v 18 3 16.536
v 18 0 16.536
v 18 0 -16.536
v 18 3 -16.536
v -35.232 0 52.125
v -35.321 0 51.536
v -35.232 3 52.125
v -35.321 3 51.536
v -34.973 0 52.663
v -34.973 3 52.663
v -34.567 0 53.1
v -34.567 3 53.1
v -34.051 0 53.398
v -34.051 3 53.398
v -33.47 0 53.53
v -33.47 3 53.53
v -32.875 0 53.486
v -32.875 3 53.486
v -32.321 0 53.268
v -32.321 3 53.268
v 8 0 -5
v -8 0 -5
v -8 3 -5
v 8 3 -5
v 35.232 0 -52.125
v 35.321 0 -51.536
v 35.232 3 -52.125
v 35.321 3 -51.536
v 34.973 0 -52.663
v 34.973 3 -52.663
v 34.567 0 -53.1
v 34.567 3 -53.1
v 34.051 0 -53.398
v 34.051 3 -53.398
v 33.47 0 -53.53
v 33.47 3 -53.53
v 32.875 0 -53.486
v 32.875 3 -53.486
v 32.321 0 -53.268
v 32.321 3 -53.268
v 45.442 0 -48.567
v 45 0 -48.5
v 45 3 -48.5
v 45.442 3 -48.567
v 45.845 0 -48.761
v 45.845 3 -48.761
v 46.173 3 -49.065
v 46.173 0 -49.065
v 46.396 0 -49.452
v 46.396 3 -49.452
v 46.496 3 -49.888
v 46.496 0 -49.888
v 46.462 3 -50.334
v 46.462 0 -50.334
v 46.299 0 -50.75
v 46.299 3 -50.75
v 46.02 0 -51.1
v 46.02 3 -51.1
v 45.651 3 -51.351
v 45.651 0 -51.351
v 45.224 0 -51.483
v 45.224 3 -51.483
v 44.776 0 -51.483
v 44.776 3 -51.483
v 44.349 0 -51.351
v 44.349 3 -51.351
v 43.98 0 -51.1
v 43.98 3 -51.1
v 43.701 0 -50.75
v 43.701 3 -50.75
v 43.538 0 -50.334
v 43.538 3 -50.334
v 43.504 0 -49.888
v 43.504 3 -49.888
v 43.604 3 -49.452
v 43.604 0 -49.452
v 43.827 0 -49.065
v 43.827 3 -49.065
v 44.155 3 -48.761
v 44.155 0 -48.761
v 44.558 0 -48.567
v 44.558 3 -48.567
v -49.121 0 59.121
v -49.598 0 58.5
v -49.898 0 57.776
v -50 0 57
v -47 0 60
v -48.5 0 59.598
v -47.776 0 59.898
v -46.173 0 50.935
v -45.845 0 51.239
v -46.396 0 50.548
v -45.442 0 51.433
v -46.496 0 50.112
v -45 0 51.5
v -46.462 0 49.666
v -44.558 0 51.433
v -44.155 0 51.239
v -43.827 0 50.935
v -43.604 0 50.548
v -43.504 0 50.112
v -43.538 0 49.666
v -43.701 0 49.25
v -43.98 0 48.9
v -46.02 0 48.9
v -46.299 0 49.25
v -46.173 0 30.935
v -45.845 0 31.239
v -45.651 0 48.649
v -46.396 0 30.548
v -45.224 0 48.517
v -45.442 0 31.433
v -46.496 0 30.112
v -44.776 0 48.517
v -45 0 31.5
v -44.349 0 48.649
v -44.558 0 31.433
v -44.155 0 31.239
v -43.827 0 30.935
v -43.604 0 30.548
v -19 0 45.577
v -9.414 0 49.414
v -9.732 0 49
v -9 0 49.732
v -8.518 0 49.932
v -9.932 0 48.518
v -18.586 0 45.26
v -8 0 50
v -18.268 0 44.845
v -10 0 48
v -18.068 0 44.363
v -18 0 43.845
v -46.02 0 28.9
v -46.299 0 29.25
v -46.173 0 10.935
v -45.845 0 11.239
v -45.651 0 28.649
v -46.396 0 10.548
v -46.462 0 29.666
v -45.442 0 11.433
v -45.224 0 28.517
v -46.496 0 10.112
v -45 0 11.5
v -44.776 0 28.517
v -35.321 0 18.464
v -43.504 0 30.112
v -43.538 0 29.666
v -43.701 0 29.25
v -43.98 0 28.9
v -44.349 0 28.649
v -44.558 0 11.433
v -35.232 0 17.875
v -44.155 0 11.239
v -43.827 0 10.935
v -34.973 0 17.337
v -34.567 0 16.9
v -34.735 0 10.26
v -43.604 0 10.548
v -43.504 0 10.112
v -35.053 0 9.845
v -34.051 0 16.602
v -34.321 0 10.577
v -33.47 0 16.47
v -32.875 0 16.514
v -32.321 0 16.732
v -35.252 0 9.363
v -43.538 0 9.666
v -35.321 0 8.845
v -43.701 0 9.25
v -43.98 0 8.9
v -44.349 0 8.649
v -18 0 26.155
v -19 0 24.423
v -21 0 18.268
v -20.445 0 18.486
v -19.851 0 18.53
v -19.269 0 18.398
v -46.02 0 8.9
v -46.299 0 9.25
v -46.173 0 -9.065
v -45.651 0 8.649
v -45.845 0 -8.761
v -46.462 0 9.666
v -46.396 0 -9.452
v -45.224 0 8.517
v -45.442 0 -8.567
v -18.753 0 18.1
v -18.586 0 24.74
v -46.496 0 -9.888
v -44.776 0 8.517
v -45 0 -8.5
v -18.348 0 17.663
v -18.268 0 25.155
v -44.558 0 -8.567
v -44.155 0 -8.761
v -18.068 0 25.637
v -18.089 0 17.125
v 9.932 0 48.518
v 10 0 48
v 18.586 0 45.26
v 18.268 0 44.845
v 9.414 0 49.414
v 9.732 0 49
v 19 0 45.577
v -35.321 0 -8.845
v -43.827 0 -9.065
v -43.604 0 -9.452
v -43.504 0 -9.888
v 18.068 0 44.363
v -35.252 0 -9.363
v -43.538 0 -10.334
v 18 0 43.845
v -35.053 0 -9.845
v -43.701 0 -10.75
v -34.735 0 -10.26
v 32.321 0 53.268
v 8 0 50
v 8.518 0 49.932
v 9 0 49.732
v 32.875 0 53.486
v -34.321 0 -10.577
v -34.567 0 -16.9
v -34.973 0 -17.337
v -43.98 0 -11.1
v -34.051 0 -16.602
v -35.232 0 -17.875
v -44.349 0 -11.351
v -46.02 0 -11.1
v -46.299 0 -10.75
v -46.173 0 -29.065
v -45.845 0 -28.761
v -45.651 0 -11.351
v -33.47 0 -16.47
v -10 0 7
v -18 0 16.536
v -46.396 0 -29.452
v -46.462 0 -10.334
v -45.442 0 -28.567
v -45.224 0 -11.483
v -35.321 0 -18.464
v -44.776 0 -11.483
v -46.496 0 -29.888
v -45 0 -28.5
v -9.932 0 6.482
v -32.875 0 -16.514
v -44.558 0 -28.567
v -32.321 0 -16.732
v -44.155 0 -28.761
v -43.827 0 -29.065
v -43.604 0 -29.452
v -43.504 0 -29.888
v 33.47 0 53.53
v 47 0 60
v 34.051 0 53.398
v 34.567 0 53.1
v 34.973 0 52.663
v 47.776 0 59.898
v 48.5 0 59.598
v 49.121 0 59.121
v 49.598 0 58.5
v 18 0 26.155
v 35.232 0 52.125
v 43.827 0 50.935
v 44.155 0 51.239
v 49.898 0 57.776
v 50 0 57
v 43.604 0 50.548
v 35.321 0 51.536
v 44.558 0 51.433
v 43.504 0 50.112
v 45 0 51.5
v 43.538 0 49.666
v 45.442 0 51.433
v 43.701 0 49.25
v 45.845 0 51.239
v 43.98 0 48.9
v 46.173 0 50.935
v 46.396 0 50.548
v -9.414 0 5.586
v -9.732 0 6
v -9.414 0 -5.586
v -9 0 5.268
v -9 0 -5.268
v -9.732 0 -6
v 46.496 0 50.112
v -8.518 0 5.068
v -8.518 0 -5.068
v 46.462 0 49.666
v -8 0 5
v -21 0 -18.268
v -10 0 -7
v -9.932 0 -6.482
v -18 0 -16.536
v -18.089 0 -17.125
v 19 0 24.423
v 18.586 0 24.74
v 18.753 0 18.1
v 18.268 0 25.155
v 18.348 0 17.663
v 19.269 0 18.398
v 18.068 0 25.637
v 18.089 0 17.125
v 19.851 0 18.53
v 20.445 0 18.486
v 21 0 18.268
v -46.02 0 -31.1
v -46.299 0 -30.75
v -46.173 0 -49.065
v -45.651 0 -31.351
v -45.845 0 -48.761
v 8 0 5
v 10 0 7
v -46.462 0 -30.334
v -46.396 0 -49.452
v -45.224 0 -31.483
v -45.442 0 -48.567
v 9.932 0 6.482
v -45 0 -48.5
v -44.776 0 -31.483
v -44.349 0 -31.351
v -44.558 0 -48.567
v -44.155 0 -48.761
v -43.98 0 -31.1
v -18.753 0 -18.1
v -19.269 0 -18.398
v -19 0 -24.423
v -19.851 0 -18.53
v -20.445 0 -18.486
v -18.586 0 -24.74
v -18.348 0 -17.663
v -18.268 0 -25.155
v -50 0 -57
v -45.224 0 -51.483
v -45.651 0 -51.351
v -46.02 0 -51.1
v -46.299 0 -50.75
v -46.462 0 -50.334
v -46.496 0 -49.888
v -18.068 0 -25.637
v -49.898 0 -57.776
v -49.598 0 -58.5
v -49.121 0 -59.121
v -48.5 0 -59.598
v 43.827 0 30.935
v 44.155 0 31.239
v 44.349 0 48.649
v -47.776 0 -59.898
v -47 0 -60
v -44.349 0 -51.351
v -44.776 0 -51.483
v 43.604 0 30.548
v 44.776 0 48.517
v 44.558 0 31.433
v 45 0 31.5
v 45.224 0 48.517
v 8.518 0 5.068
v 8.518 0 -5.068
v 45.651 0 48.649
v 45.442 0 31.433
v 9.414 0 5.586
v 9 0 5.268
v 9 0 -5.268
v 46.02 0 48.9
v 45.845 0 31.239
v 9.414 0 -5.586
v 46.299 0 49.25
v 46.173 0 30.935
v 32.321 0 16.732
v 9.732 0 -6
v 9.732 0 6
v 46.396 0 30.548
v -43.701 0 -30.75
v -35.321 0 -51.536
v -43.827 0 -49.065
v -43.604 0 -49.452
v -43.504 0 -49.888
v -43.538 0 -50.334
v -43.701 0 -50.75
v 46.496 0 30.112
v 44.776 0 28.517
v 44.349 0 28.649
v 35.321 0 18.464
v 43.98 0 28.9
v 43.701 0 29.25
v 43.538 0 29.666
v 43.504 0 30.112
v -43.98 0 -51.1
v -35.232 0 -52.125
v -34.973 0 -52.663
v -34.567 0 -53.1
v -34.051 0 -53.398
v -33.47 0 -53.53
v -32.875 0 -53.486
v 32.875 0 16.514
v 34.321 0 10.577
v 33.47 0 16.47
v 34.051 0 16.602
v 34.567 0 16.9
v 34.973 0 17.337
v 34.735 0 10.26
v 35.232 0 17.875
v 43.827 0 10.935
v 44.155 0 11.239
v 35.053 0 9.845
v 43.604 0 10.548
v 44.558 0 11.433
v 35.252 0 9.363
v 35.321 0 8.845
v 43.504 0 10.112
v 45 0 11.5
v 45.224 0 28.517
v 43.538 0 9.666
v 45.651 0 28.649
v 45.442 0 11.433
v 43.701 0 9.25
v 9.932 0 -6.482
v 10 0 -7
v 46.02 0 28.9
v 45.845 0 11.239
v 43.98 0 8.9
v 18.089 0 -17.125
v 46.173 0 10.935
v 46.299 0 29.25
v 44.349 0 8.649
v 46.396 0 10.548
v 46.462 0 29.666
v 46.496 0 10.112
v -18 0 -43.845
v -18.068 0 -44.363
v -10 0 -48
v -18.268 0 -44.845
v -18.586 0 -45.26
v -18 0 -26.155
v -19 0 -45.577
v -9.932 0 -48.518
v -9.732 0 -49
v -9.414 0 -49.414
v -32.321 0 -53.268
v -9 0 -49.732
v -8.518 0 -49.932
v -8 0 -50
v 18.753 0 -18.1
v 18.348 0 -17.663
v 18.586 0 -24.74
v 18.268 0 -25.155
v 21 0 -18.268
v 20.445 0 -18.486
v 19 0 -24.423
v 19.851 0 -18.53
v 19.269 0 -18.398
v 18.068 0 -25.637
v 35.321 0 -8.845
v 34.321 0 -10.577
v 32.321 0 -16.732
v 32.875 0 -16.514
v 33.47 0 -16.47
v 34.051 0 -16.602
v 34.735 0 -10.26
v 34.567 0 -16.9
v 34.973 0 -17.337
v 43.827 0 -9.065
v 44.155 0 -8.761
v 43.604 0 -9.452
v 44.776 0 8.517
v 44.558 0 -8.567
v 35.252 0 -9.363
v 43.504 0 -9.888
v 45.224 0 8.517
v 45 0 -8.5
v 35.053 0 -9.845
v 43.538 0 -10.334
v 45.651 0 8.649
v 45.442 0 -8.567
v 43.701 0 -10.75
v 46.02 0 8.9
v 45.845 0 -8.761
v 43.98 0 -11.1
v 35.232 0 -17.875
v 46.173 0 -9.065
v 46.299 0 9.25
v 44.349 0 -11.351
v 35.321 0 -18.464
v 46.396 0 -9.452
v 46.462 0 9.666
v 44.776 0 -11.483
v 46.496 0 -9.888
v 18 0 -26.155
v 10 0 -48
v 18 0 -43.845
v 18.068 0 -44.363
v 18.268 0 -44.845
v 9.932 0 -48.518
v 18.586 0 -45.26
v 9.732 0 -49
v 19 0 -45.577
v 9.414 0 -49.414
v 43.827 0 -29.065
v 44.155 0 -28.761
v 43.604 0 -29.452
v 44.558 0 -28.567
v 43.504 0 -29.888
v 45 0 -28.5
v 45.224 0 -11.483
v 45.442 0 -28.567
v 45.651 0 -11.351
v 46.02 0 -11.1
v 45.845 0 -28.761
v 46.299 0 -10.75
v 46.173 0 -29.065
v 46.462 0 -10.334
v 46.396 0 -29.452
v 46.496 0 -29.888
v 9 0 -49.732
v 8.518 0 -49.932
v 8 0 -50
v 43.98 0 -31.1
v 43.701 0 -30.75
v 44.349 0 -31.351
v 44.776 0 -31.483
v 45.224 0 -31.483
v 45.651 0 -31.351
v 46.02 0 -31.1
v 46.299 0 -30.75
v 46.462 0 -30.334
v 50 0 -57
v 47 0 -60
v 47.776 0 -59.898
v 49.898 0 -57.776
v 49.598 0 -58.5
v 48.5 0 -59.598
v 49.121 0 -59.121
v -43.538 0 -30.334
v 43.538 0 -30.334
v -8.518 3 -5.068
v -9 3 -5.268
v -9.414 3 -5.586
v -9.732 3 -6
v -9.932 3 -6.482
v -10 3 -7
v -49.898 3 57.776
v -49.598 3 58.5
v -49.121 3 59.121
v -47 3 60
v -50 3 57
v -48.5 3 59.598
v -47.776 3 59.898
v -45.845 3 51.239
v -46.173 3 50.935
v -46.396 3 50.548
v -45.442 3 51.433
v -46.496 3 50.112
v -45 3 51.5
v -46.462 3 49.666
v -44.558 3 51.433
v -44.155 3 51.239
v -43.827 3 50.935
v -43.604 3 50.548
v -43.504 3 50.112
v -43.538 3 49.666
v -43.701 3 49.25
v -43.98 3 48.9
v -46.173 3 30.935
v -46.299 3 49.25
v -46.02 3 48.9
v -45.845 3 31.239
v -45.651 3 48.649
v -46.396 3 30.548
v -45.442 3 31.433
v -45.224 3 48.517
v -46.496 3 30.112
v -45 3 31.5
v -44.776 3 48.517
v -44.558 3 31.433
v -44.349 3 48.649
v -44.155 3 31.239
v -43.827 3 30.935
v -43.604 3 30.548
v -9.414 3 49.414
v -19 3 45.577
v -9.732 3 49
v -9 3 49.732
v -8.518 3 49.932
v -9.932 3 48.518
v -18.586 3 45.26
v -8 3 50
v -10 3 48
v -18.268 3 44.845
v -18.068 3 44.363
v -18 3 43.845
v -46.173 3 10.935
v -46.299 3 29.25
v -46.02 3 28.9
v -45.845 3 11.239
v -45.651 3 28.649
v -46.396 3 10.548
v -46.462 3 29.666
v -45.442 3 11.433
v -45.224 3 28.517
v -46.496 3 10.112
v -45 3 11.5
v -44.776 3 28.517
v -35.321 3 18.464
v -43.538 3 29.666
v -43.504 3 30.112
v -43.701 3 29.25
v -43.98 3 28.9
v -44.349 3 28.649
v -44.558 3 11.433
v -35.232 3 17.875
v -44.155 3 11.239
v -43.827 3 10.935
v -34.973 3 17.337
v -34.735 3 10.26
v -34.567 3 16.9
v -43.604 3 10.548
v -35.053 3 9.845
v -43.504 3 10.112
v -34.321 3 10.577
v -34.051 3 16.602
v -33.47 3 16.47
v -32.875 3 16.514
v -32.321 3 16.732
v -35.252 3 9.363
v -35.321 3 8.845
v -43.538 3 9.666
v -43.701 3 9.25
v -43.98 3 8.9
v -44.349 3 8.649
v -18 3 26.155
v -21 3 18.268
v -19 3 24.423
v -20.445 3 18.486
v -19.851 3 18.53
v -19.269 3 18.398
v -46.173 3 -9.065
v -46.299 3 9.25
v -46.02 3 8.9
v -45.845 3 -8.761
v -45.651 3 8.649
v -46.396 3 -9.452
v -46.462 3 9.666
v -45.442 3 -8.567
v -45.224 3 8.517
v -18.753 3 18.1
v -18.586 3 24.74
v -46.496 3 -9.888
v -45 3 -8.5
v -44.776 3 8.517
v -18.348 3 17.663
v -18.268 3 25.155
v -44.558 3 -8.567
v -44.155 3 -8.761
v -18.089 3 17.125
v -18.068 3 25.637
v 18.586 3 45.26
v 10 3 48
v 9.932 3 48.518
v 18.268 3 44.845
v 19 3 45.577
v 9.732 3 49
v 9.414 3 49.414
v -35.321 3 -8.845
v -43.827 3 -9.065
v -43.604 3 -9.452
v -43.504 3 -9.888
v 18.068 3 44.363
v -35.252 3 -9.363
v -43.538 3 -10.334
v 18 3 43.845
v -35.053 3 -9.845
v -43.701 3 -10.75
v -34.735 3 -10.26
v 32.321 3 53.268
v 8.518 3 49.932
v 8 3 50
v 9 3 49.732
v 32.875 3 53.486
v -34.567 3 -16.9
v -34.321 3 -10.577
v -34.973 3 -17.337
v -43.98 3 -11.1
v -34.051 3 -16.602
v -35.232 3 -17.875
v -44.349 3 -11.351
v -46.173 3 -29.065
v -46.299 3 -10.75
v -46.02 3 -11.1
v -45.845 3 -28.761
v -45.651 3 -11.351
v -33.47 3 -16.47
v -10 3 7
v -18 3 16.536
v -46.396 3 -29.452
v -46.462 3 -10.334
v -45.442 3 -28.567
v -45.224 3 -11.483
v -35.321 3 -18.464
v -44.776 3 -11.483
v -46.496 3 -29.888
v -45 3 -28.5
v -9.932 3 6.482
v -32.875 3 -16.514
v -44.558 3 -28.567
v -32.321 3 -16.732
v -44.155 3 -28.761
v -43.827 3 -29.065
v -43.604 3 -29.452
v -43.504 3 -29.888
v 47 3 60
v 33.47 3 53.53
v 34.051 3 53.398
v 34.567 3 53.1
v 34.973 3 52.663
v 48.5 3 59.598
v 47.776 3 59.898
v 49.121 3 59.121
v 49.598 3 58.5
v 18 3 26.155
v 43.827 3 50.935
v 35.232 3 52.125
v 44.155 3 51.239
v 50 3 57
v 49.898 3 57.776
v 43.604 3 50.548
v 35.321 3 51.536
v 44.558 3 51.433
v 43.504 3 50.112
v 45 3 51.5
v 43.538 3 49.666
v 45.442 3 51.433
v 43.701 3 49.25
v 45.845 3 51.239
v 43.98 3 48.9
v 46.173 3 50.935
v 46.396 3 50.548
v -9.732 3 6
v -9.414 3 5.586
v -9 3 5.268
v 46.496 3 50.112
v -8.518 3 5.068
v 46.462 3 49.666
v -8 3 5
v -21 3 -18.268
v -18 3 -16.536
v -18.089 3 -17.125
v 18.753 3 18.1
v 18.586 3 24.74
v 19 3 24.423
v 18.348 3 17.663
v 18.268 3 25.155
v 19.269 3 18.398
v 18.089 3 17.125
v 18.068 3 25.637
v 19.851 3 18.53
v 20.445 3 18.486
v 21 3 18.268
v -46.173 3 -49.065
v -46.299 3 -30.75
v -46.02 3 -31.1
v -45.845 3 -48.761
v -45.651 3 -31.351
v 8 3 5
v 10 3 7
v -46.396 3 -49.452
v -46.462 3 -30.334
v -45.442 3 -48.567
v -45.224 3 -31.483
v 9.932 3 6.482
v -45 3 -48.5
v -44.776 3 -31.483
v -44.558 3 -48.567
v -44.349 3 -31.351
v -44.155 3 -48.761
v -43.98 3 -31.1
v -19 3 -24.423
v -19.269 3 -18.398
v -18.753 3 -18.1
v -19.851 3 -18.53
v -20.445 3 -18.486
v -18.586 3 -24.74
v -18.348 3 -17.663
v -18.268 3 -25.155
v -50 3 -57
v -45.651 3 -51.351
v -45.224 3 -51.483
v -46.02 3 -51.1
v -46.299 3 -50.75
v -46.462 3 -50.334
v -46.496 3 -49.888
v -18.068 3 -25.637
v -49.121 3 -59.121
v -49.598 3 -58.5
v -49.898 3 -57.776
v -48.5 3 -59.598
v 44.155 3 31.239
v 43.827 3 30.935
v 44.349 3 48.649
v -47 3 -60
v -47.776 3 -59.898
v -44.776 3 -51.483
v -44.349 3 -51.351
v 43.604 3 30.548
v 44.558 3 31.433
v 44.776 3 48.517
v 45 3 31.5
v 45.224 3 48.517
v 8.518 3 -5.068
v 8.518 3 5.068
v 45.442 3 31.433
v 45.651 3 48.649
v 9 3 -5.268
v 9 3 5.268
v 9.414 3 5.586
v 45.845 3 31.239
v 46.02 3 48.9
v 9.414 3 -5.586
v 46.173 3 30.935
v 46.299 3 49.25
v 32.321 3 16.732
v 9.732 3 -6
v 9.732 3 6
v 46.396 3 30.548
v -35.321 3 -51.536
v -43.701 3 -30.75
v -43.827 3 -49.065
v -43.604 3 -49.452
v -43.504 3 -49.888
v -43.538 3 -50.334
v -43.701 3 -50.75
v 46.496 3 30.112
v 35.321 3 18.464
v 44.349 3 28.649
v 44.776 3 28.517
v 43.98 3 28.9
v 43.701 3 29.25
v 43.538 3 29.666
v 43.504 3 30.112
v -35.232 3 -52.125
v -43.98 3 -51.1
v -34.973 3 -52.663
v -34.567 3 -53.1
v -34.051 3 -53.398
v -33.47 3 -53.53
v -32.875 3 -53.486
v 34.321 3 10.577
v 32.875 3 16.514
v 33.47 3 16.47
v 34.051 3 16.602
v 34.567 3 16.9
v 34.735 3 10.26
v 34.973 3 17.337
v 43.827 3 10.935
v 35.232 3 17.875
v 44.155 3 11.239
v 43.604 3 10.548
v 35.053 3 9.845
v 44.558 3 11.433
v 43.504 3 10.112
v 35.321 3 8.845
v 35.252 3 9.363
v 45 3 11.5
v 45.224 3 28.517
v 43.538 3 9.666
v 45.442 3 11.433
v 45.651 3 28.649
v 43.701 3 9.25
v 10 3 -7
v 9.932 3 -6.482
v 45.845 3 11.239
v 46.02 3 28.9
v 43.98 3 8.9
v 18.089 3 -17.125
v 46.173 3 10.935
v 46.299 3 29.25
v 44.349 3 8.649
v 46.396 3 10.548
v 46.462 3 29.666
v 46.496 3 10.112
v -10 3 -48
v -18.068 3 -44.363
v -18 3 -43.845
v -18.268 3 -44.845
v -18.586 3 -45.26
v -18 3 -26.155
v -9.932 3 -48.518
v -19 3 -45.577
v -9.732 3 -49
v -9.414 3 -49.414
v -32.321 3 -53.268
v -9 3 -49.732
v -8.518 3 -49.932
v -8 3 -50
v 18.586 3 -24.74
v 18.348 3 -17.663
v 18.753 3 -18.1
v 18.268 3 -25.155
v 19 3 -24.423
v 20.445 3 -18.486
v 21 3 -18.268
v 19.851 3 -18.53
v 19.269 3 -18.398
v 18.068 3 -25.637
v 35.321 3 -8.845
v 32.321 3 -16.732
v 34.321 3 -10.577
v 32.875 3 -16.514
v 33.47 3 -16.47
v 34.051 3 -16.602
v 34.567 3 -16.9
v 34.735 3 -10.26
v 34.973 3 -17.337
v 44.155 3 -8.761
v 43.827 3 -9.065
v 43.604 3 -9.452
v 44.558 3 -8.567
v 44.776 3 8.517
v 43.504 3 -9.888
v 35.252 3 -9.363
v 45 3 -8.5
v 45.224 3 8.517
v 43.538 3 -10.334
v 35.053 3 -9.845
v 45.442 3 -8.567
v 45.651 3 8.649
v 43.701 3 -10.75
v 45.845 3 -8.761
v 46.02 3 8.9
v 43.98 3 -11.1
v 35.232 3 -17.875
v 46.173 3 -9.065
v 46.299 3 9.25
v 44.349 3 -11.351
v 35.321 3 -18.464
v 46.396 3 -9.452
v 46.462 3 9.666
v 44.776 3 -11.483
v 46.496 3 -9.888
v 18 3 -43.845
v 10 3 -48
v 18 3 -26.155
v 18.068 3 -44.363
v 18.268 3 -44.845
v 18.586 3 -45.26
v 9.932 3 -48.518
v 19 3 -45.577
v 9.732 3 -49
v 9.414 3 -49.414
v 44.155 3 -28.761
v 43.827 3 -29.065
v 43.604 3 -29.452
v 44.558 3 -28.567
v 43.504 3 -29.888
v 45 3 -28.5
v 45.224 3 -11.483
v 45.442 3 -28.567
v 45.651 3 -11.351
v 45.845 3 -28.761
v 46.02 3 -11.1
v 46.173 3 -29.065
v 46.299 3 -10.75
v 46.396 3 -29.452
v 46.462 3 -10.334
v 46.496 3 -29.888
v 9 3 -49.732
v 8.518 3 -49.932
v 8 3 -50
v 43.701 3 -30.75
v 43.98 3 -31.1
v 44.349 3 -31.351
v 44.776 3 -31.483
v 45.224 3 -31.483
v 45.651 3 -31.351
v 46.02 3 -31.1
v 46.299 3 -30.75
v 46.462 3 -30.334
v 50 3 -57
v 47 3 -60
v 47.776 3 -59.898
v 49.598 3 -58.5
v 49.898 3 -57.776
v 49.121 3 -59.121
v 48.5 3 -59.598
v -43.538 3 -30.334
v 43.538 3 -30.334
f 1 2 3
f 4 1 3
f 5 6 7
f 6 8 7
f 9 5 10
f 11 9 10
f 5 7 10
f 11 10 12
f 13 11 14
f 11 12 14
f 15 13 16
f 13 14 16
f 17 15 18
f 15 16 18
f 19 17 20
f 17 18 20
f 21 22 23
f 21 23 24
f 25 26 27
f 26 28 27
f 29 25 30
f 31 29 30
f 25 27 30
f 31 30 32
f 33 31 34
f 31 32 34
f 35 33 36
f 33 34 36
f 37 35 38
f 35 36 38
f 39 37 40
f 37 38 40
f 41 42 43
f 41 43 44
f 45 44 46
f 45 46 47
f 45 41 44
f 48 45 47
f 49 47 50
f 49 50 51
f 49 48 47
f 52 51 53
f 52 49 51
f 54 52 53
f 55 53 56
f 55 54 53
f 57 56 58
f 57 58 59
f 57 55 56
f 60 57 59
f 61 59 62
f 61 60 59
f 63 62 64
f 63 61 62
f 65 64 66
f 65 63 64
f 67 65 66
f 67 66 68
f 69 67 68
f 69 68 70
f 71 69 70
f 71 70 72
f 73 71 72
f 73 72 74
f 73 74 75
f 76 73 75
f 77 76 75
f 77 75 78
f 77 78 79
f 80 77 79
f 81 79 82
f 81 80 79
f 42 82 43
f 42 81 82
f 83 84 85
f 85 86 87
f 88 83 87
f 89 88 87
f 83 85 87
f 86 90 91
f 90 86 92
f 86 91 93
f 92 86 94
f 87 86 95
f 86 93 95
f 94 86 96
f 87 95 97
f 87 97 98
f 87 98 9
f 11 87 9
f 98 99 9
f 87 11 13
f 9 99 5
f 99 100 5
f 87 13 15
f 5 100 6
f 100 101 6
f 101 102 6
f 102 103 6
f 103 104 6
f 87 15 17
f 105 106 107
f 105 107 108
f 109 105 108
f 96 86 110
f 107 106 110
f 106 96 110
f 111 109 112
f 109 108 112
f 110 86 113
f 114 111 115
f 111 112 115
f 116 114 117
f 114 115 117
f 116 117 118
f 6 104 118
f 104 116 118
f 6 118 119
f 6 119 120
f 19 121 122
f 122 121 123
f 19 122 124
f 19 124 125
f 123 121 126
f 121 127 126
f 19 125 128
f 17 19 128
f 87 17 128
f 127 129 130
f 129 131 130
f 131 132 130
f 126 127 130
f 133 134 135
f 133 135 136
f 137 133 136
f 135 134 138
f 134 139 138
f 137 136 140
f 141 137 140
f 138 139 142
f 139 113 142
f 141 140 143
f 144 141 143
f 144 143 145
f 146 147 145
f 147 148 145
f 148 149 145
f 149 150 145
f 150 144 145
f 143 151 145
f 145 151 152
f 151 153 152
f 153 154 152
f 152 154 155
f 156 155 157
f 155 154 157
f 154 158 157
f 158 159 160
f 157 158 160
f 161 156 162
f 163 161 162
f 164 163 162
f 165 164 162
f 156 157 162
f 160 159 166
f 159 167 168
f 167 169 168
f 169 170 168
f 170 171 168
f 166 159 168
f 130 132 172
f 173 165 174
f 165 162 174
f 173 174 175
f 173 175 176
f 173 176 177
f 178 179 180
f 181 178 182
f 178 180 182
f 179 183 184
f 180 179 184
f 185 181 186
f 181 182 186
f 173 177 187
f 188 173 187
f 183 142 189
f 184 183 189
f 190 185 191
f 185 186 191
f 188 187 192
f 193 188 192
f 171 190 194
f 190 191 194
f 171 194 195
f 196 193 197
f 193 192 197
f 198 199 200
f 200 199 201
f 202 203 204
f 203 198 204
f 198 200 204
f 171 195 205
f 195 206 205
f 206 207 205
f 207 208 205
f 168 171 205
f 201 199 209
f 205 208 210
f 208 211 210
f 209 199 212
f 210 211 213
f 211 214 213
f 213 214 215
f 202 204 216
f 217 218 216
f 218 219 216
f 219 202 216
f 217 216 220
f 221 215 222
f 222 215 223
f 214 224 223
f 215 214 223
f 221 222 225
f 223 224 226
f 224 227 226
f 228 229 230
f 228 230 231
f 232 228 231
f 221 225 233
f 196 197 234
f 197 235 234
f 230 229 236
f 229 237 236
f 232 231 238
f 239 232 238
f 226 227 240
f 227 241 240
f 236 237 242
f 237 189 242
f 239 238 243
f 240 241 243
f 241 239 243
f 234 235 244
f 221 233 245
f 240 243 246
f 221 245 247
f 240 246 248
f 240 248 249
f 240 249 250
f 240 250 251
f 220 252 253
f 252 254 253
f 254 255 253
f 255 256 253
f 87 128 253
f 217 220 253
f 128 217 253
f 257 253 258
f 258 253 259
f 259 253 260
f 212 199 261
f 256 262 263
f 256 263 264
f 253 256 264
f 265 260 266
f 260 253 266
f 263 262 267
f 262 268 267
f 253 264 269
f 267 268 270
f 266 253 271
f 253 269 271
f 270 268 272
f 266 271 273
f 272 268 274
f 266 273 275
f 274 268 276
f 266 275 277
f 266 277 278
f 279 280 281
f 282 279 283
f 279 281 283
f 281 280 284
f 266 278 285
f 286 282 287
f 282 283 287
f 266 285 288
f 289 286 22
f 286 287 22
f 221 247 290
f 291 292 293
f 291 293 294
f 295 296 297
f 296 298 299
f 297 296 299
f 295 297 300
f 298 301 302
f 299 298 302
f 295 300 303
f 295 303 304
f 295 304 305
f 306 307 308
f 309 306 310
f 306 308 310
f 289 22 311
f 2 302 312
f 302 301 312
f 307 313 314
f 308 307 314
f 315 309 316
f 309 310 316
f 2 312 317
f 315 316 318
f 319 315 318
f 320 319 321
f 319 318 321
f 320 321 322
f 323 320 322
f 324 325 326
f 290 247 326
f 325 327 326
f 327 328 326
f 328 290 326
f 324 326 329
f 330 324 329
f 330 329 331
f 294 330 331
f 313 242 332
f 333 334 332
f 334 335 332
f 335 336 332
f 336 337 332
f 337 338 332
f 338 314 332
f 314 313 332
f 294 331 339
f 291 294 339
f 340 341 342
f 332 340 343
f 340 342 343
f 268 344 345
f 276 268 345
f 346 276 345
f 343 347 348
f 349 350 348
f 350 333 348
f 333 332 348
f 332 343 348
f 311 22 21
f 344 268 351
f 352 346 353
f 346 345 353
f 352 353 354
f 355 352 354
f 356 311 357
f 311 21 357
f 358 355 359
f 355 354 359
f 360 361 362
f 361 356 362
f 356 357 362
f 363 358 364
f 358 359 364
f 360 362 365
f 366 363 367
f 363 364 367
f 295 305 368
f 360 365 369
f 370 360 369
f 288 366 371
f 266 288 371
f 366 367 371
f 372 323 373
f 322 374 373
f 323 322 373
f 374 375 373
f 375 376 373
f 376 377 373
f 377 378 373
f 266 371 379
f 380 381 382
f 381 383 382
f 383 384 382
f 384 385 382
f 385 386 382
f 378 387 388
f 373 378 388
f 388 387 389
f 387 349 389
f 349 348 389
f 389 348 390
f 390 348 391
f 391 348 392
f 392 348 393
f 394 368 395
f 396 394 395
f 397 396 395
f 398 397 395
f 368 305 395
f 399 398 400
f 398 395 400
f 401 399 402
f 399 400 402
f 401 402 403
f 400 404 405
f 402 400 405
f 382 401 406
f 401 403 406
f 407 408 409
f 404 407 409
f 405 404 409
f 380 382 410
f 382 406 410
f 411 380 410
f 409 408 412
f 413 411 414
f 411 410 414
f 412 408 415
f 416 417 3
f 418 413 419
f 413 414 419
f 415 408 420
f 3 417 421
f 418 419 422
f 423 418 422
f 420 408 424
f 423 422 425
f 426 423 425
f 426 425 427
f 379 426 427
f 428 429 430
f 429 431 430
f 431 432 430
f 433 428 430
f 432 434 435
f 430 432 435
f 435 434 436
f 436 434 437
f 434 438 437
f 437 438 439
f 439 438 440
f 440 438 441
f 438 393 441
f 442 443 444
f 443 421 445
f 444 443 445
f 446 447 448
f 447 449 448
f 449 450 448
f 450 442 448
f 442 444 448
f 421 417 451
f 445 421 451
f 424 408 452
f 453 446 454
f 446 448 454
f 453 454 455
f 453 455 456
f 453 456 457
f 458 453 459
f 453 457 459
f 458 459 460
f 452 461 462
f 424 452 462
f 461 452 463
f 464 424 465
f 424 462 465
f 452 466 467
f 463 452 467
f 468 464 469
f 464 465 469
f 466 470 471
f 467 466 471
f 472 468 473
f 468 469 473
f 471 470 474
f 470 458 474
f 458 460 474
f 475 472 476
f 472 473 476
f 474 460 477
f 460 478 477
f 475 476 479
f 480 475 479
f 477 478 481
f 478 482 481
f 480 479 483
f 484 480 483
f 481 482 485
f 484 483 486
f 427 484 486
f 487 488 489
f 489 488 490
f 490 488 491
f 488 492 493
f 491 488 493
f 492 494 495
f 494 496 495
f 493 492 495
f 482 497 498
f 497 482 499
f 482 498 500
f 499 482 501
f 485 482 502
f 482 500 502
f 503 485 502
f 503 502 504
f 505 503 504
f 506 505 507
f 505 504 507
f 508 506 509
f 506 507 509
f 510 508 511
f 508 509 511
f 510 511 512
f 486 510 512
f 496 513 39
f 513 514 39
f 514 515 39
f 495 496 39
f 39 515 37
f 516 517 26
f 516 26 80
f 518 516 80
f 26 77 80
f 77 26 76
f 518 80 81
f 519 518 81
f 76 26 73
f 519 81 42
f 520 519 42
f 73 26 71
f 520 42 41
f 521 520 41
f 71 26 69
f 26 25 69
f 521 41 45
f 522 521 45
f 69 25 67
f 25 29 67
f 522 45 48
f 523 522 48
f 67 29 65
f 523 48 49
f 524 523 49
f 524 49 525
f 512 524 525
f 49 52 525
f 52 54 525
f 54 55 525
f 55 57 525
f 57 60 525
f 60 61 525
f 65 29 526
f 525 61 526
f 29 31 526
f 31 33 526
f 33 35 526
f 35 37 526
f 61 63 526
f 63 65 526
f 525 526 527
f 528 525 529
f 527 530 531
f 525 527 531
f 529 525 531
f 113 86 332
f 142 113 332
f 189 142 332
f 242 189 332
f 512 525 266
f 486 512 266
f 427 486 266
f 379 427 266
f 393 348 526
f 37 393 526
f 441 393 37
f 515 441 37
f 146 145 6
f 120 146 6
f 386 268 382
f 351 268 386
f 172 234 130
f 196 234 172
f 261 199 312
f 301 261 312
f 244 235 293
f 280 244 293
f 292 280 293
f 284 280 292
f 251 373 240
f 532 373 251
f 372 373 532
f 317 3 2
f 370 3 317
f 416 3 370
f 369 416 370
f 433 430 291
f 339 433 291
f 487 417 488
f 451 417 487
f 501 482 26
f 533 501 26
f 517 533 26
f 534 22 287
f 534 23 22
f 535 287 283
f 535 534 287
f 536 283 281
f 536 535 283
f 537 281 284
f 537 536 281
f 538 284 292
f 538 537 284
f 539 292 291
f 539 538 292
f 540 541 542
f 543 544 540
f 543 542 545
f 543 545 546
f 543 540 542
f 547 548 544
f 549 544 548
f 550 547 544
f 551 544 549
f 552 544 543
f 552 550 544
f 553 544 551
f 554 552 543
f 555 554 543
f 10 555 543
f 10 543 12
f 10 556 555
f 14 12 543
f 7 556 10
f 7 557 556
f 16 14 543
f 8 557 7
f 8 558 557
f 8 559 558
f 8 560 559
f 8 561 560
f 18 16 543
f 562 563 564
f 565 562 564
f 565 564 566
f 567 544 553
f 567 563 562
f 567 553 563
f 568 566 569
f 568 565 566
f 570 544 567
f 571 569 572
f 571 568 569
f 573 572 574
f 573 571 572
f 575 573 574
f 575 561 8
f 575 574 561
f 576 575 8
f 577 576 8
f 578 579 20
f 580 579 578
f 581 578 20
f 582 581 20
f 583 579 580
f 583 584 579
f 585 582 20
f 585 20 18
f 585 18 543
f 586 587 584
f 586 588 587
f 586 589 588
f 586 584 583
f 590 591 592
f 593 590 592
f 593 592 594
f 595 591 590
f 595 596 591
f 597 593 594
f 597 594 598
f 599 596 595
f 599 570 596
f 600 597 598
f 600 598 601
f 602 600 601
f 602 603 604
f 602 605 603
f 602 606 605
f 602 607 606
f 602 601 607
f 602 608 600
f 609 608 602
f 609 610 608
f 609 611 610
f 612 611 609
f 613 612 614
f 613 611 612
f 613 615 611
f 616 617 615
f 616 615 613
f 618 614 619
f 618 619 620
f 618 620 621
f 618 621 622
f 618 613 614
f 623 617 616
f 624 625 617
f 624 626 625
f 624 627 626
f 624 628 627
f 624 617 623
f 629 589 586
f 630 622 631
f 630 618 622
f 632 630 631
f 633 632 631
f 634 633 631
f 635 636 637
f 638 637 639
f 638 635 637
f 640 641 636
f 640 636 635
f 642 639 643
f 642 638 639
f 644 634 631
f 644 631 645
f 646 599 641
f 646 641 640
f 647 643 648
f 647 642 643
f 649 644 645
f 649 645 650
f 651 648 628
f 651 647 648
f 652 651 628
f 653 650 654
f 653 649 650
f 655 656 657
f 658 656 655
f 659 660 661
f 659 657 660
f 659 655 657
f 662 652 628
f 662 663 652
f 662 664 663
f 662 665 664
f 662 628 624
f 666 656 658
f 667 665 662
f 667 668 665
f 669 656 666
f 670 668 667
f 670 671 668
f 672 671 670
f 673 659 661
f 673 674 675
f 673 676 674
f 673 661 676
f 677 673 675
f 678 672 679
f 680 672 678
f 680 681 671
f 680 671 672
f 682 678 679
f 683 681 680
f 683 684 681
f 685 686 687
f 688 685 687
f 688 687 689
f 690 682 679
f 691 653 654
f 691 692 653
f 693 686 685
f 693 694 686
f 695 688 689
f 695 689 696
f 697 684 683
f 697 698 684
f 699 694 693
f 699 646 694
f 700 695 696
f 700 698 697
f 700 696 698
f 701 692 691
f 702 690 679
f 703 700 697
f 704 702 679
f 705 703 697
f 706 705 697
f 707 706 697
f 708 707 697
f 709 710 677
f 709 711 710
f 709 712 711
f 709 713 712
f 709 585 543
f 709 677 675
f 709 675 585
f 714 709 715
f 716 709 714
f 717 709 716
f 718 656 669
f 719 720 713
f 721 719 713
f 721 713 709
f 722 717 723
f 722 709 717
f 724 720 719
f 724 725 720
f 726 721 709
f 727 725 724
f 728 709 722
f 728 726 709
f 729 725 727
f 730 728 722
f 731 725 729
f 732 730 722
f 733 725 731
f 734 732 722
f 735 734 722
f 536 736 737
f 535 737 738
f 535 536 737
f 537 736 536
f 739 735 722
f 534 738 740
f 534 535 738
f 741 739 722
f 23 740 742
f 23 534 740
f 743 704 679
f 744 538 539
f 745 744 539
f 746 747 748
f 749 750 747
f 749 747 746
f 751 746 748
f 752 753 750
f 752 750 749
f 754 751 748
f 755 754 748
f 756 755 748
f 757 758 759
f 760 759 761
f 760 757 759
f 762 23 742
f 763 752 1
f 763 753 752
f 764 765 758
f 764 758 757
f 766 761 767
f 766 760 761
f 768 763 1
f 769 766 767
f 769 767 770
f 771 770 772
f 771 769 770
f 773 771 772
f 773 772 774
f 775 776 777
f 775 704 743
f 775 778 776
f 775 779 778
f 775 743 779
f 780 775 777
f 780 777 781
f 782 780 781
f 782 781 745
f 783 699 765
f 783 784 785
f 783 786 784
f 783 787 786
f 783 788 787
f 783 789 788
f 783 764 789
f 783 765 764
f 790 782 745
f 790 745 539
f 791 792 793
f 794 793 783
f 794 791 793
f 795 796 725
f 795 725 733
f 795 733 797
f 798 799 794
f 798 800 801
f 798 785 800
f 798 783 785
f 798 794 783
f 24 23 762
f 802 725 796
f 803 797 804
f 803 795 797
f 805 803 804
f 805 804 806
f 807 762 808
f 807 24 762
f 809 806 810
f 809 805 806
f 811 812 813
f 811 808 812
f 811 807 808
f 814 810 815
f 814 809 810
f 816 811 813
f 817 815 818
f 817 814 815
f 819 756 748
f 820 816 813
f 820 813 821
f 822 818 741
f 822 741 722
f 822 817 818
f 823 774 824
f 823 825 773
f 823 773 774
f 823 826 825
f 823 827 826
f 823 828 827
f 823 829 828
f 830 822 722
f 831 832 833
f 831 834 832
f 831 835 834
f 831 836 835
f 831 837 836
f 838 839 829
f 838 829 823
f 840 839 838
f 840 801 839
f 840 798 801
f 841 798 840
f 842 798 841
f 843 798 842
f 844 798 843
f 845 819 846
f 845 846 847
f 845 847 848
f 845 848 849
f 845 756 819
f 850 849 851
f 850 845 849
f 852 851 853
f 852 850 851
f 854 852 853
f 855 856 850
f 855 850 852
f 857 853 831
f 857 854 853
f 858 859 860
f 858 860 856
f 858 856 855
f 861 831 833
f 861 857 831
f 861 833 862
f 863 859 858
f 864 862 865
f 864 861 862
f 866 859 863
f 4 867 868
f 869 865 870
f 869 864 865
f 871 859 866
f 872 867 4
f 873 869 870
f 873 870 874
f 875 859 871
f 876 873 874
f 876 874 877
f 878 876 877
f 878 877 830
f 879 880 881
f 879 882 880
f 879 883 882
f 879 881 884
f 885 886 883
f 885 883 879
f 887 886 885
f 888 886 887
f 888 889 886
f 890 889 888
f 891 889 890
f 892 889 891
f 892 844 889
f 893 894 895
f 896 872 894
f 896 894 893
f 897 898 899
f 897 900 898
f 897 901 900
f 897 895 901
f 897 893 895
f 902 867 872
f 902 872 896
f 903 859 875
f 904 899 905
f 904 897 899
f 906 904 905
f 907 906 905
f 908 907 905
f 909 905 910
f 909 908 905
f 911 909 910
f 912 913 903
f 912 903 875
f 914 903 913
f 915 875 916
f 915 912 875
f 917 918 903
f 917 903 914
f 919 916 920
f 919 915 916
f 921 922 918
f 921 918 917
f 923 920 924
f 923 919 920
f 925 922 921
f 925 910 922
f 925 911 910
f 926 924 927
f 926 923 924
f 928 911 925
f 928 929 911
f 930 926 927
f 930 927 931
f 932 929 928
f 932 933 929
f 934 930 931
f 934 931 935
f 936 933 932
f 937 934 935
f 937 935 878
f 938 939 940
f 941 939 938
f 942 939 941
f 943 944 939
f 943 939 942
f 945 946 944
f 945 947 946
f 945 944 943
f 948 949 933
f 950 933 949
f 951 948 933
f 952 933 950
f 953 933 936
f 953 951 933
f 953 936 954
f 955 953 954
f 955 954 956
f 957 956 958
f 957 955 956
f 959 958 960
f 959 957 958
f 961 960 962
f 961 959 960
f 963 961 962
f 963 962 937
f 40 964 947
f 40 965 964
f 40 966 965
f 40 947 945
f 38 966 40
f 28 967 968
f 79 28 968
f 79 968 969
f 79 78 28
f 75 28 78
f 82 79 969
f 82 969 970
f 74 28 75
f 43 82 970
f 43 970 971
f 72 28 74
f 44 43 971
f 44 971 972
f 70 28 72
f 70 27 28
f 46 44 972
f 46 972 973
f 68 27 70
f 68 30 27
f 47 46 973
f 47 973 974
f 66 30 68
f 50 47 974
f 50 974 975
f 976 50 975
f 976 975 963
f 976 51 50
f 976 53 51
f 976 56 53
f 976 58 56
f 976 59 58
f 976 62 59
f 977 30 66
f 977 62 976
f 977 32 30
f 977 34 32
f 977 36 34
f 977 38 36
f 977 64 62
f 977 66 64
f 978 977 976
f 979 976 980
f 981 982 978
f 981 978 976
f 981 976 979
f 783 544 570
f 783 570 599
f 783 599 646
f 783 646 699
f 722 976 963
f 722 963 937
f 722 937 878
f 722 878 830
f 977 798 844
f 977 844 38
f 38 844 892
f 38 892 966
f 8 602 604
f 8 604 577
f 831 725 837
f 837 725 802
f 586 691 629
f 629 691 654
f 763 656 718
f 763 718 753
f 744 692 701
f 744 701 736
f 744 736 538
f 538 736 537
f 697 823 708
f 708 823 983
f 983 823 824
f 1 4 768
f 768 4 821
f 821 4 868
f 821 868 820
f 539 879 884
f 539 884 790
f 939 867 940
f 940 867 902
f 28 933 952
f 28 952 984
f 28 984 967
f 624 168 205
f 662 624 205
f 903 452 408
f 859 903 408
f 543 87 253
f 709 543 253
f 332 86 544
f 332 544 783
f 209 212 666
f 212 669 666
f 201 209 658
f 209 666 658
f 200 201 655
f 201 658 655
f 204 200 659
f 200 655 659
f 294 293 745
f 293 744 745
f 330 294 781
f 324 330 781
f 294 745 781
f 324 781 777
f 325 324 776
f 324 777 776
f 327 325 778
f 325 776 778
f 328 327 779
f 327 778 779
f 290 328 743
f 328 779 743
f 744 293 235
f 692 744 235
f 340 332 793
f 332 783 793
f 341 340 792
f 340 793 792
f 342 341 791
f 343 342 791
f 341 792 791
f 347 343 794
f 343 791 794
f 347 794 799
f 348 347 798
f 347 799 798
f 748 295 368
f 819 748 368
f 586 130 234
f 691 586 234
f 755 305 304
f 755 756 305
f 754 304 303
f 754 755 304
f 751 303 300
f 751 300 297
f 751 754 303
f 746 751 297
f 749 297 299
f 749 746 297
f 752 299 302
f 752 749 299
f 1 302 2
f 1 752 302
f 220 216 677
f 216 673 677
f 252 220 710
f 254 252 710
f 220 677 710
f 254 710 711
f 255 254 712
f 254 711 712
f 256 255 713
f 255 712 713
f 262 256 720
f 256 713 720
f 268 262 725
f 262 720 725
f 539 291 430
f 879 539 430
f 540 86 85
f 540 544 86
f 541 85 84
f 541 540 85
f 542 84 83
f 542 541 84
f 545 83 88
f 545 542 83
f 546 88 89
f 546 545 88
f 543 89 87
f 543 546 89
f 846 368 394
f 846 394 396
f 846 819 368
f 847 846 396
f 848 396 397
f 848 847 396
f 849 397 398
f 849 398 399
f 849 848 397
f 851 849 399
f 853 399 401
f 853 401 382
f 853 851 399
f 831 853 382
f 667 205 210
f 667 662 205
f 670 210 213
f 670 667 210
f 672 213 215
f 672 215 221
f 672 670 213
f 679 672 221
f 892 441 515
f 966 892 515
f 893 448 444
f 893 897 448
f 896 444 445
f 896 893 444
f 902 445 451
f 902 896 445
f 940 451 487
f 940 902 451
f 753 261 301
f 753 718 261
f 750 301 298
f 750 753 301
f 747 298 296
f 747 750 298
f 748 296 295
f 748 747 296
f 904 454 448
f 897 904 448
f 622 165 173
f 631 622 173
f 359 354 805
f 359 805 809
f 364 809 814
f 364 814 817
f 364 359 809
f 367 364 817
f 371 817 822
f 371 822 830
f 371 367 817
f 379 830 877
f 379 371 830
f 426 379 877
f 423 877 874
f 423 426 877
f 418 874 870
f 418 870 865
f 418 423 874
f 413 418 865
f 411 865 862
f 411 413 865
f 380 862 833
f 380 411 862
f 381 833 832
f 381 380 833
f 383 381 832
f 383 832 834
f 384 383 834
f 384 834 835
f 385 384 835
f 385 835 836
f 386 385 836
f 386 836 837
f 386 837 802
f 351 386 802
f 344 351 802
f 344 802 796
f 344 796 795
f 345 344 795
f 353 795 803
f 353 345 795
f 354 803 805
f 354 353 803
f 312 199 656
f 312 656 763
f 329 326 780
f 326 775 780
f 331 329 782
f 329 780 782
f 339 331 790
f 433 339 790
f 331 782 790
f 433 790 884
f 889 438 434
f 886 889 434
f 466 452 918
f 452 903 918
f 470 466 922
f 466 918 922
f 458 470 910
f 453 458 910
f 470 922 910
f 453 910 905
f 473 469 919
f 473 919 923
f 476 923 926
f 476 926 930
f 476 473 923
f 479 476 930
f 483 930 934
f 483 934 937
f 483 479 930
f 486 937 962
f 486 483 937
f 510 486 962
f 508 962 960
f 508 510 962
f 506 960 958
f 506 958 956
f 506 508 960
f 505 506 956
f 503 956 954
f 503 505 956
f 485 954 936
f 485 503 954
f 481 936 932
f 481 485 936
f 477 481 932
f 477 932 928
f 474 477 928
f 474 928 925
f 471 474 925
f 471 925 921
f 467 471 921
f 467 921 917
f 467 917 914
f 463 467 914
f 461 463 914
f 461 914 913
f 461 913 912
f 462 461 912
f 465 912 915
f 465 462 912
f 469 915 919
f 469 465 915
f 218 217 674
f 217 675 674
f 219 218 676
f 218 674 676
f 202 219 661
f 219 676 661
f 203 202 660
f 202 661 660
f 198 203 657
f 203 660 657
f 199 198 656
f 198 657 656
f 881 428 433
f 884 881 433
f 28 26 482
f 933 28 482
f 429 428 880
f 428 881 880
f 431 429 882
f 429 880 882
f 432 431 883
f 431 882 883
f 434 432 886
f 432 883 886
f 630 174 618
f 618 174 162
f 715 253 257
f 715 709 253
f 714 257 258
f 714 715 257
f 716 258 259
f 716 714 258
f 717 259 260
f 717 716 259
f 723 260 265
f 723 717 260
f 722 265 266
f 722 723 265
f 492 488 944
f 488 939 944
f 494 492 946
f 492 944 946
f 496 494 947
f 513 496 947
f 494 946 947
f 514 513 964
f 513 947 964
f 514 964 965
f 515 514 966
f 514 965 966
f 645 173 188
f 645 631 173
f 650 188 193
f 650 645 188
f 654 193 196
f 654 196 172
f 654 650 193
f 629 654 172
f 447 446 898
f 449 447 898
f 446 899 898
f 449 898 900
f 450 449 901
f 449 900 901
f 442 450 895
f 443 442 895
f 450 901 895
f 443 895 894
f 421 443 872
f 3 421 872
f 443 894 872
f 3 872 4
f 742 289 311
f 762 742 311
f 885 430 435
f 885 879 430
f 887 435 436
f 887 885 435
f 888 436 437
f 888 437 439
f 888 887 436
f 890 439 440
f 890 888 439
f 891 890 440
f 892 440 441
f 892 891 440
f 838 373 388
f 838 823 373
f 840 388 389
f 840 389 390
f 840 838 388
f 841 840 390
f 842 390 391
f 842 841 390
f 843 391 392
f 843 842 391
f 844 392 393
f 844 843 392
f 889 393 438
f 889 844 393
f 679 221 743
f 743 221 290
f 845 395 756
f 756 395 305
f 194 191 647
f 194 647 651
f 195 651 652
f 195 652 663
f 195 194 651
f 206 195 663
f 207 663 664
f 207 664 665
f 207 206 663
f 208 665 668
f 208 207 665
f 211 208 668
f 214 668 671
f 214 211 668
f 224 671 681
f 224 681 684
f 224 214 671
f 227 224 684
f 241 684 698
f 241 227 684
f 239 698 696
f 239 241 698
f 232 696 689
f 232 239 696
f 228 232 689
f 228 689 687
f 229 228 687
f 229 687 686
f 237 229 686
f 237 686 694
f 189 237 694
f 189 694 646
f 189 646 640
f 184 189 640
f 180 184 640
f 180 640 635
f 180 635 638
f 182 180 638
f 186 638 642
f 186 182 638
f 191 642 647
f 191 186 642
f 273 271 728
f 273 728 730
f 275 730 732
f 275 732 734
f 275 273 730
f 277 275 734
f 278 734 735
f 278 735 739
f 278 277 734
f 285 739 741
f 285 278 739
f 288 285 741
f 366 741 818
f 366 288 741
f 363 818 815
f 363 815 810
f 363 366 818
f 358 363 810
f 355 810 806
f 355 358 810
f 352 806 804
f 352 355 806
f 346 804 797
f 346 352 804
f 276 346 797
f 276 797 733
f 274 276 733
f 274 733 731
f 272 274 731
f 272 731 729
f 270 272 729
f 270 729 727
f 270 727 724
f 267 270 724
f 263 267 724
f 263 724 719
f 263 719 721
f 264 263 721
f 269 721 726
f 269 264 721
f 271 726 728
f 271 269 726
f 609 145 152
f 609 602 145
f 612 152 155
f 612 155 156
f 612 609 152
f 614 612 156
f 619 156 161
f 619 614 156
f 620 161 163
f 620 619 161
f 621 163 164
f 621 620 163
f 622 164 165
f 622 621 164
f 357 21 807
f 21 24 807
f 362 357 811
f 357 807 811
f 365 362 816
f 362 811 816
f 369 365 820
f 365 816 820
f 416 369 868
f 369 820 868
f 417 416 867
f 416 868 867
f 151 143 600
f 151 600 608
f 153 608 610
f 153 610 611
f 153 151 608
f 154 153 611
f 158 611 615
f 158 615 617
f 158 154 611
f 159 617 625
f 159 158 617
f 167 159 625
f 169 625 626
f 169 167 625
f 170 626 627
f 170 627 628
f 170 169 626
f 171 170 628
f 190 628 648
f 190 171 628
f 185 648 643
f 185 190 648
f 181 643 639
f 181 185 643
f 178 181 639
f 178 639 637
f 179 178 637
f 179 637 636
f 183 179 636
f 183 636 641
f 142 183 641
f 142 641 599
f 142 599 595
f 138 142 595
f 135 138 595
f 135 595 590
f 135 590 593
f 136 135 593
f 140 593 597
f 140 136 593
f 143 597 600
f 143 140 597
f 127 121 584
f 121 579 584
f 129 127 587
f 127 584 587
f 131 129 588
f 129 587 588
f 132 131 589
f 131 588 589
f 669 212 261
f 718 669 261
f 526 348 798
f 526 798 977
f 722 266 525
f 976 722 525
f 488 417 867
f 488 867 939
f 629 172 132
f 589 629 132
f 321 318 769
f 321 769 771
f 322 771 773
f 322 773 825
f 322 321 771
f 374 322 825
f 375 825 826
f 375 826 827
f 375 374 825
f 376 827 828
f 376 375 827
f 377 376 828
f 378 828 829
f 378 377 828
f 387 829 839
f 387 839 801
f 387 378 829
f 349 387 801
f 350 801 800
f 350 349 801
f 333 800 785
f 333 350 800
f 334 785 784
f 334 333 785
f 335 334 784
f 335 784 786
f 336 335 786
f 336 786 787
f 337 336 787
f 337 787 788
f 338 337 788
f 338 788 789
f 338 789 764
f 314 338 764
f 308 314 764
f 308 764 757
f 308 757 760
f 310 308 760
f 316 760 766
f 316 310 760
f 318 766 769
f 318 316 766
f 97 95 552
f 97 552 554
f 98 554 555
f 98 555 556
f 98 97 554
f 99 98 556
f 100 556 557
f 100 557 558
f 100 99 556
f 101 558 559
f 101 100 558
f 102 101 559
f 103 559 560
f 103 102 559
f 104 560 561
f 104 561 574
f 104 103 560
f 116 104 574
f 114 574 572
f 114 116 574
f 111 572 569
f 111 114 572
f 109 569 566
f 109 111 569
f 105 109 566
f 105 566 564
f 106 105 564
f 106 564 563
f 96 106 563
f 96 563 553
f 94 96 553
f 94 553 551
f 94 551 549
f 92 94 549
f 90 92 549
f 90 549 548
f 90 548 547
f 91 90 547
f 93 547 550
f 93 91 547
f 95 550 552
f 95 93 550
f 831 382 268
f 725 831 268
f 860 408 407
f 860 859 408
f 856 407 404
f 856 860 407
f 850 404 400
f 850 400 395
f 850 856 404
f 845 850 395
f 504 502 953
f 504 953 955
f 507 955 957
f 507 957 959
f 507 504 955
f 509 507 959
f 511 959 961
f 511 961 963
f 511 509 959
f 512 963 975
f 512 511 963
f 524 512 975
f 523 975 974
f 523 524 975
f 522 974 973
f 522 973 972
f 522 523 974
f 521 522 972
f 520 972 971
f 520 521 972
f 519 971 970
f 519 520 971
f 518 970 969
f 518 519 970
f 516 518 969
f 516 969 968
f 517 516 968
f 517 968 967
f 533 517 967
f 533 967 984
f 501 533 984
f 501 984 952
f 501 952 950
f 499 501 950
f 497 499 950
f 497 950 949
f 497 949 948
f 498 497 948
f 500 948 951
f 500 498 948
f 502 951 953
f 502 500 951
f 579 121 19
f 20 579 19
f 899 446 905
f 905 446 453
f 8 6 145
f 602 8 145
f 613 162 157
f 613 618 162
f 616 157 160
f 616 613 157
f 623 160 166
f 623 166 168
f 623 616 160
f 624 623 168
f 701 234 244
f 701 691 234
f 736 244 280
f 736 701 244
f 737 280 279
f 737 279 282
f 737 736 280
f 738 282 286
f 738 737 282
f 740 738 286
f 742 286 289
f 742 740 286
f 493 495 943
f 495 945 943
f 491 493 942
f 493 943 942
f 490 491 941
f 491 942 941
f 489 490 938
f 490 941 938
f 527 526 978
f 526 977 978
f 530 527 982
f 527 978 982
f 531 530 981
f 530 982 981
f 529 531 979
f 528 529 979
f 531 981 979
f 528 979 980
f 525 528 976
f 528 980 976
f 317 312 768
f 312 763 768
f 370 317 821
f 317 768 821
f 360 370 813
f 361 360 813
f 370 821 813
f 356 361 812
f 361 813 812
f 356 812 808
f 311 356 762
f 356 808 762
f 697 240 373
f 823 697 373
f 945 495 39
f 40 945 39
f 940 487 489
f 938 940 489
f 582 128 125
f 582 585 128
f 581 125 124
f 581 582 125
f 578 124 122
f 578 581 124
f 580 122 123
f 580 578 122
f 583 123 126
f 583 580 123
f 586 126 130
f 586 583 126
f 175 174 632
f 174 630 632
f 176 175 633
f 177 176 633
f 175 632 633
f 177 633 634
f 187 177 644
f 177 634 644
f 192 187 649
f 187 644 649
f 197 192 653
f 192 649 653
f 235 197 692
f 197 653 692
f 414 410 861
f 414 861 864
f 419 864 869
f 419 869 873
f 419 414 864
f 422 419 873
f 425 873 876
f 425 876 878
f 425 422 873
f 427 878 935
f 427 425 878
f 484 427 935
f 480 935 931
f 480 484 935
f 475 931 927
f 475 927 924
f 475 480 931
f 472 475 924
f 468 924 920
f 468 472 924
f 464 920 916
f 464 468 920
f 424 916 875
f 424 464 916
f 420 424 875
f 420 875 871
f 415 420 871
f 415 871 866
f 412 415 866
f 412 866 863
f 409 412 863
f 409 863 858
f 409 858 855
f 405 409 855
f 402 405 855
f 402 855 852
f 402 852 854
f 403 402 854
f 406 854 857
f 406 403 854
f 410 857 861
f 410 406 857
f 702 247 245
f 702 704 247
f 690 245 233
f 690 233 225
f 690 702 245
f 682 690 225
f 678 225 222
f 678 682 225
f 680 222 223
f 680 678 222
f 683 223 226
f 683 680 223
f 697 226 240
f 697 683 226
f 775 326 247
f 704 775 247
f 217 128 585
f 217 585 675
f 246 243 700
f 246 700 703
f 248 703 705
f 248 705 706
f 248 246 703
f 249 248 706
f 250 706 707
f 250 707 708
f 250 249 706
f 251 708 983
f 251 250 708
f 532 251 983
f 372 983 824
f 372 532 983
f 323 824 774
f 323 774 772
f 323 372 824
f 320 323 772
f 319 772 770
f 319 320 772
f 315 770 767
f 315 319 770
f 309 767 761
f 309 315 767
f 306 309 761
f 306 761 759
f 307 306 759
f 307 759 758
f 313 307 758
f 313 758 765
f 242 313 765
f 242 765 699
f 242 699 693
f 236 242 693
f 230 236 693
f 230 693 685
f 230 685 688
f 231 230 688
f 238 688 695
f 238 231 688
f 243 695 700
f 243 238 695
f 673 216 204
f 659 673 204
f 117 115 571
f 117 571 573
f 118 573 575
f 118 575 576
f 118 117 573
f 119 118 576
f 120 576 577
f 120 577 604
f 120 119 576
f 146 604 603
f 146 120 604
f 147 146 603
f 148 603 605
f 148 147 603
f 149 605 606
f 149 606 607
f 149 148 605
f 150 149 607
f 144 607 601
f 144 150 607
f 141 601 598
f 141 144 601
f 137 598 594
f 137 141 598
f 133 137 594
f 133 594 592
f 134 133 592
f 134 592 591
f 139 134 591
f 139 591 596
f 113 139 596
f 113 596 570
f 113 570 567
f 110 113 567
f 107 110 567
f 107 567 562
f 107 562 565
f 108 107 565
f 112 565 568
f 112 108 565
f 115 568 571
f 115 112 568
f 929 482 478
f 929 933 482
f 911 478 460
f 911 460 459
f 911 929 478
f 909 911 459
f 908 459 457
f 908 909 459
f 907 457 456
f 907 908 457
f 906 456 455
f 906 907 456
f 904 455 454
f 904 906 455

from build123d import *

# Parameters (mm, degrees)
SKETCH_1_W      = 100
SKETCH_1_H      = 120
SKETCH_1_R      = 1.5
SKETCH_1_W_2    = 20
SKETCH_1_H_2    = 45
EXTRUDE_1_DEPTH = 3
FILLET_1_R      = 3
FILLET_2_R      = 2


with BuildPart() as part:
    # 草图1 → 凸台-拉伸1 (new body)
    with BuildSketch(Plane(origin=(0, 0, 0), x_dir=(1, 0, 0), z_dir=(0, 1, 0))):
        Rectangle(SKETCH_1_W, SKETCH_1_H)
        with Locations(Location((-45, -50, 0), (0, 0, 270))):
            Circle(SKETCH_1_R, mode=Mode.SUBTRACT)
        with Locations(Location((-45, -30, 0), (0, 0, 270))):
            Circle(SKETCH_1_R, mode=Mode.SUBTRACT)
        Polygon((-35.320508076, -15), (-18, -25), (-18, -45), (-35.320508076, -55), align=None, mode=Mode.SUBTRACT)
        with Locations(Location((-45, -10, 0), (0, 0, 270))):
            Circle(SKETCH_1_R, mode=Mode.SUBTRACT)
        Polygon((-35.320508076, -10), (-35.320508076, 10), (-18, 20), (-18, -20), align=None, mode=Mode.SUBTRACT)
        with Locations((0, -27.5)):
            Rectangle(SKETCH_1_W_2, SKETCH_1_H_2, mode=Mode.SUBTRACT)
        with Locations((0, 27.5)):
            Rectangle(SKETCH_1_W_2, SKETCH_1_H_2, mode=Mode.SUBTRACT)
        with Locations(Location((45, -50, 0), (0, 0, 270))):
            Circle(SKETCH_1_R, mode=Mode.SUBTRACT)
        Polygon((18, -25), (35.320508076, -15), (35.320508076, -55), (18, -45), align=None, mode=Mode.SUBTRACT)
        with Locations(Location((45, -30, 0), (0, 0, 270))):
            Circle(SKETCH_1_R, mode=Mode.SUBTRACT)
        Polygon((35.320508076, -10), (18, -20), (18, 20), (35.320508076, 10), align=None, mode=Mode.SUBTRACT)
        with Locations(Location((45, -10, 0), (0, 0, 270))):
            Circle(SKETCH_1_R, mode=Mode.SUBTRACT)
        with Locations(Location((-45, 10, 0), (0, 0, 270))):
            Circle(SKETCH_1_R, mode=Mode.SUBTRACT)
        with Locations(Location((-45, 30, 0), (0, 0, 270))):
            Circle(SKETCH_1_R, mode=Mode.SUBTRACT)
        Polygon((-35.320508076, 15), (-35.320508076, 55), (-18, 45), (-18, 25), align=None, mode=Mode.SUBTRACT)
        with Locations(Location((-45, 50, 0), (0, 0, 270))):
            Circle(SKETCH_1_R, mode=Mode.SUBTRACT)
        with Locations(Location((45, 10, 0), (0, 0, 270))):
            Circle(SKETCH_1_R, mode=Mode.SUBTRACT)
        with Locations(Location((45, 30, 0), (0, 0, 270))):
            Circle(SKETCH_1_R, mode=Mode.SUBTRACT)
        Polygon((35.320508076, 15), (18, 25), (18, 45), (35.320508076, 55), align=None, mode=Mode.SUBTRACT)
        with Locations(Location((45, 50, 0), (0, 0, 270))):
            Circle(SKETCH_1_R, mode=Mode.SUBTRACT)
    extrude(amount=EXTRUDE_1_DEPTH)

    # 圆角1
    fillet_1_edges = [part.edges().sort_by_distance(p)[0] for p in [
        (-50, 1.5, 60),
        (-50, 1.5, -60),
        (50, 1.5, -60),
        (50, 1.5, 60),
    ]]
    fillet(fillet_1_edges, radius=FILLET_1_R)

    # 圆角2
    fillet_2_edges = [part.edges().sort_by_distance(p)[0] for p in [
        (18, 1.5, -25),
        (35.320508076, 1.5, -15),
        (35.320508076, 1.5, -55),
        (18, 1.5, -45),
        (18, 1.5, 20),
        (35.320508076, 1.5, 10),
        (35.320508076, 1.5, -10),
        (18, 1.5, -20),
        (-18, 1.5, 25),
        (-35.320508076, 1.5, 15),
        (-35.320508076, 1.5, 55),
        (-18, 1.5, 45),
        (-35.320508076, 1.5, -55),
        (-35.320508076, 1.5, -15),
        (-18, 1.5, -25),
        (-18, 1.5, -45),
        (-35.320508076, 1.5, -10),
        (-35.320508076, 1.5, 10),
        (-18, 1.5, 20),
        (-18, 1.5, -20),
        (18, 1.5, 45),
        (35.320508076, 1.5, 55),
        (35.320508076, 1.5, 15),
        (18, 1.5, 25),
        (10, 1.5, 5),
        (-10, 1.5, 5),
        (-10, 1.5, 50),
        (10, 1.5, 50),
        (10, 1.5, -50),
        (-10, 1.5, -50),
        (-10, 1.5, -5),
        (10, 1.5, -5),
    ]]
    fillet(fillet_2_edges, radius=FILLET_2_R)


solid = part.part
